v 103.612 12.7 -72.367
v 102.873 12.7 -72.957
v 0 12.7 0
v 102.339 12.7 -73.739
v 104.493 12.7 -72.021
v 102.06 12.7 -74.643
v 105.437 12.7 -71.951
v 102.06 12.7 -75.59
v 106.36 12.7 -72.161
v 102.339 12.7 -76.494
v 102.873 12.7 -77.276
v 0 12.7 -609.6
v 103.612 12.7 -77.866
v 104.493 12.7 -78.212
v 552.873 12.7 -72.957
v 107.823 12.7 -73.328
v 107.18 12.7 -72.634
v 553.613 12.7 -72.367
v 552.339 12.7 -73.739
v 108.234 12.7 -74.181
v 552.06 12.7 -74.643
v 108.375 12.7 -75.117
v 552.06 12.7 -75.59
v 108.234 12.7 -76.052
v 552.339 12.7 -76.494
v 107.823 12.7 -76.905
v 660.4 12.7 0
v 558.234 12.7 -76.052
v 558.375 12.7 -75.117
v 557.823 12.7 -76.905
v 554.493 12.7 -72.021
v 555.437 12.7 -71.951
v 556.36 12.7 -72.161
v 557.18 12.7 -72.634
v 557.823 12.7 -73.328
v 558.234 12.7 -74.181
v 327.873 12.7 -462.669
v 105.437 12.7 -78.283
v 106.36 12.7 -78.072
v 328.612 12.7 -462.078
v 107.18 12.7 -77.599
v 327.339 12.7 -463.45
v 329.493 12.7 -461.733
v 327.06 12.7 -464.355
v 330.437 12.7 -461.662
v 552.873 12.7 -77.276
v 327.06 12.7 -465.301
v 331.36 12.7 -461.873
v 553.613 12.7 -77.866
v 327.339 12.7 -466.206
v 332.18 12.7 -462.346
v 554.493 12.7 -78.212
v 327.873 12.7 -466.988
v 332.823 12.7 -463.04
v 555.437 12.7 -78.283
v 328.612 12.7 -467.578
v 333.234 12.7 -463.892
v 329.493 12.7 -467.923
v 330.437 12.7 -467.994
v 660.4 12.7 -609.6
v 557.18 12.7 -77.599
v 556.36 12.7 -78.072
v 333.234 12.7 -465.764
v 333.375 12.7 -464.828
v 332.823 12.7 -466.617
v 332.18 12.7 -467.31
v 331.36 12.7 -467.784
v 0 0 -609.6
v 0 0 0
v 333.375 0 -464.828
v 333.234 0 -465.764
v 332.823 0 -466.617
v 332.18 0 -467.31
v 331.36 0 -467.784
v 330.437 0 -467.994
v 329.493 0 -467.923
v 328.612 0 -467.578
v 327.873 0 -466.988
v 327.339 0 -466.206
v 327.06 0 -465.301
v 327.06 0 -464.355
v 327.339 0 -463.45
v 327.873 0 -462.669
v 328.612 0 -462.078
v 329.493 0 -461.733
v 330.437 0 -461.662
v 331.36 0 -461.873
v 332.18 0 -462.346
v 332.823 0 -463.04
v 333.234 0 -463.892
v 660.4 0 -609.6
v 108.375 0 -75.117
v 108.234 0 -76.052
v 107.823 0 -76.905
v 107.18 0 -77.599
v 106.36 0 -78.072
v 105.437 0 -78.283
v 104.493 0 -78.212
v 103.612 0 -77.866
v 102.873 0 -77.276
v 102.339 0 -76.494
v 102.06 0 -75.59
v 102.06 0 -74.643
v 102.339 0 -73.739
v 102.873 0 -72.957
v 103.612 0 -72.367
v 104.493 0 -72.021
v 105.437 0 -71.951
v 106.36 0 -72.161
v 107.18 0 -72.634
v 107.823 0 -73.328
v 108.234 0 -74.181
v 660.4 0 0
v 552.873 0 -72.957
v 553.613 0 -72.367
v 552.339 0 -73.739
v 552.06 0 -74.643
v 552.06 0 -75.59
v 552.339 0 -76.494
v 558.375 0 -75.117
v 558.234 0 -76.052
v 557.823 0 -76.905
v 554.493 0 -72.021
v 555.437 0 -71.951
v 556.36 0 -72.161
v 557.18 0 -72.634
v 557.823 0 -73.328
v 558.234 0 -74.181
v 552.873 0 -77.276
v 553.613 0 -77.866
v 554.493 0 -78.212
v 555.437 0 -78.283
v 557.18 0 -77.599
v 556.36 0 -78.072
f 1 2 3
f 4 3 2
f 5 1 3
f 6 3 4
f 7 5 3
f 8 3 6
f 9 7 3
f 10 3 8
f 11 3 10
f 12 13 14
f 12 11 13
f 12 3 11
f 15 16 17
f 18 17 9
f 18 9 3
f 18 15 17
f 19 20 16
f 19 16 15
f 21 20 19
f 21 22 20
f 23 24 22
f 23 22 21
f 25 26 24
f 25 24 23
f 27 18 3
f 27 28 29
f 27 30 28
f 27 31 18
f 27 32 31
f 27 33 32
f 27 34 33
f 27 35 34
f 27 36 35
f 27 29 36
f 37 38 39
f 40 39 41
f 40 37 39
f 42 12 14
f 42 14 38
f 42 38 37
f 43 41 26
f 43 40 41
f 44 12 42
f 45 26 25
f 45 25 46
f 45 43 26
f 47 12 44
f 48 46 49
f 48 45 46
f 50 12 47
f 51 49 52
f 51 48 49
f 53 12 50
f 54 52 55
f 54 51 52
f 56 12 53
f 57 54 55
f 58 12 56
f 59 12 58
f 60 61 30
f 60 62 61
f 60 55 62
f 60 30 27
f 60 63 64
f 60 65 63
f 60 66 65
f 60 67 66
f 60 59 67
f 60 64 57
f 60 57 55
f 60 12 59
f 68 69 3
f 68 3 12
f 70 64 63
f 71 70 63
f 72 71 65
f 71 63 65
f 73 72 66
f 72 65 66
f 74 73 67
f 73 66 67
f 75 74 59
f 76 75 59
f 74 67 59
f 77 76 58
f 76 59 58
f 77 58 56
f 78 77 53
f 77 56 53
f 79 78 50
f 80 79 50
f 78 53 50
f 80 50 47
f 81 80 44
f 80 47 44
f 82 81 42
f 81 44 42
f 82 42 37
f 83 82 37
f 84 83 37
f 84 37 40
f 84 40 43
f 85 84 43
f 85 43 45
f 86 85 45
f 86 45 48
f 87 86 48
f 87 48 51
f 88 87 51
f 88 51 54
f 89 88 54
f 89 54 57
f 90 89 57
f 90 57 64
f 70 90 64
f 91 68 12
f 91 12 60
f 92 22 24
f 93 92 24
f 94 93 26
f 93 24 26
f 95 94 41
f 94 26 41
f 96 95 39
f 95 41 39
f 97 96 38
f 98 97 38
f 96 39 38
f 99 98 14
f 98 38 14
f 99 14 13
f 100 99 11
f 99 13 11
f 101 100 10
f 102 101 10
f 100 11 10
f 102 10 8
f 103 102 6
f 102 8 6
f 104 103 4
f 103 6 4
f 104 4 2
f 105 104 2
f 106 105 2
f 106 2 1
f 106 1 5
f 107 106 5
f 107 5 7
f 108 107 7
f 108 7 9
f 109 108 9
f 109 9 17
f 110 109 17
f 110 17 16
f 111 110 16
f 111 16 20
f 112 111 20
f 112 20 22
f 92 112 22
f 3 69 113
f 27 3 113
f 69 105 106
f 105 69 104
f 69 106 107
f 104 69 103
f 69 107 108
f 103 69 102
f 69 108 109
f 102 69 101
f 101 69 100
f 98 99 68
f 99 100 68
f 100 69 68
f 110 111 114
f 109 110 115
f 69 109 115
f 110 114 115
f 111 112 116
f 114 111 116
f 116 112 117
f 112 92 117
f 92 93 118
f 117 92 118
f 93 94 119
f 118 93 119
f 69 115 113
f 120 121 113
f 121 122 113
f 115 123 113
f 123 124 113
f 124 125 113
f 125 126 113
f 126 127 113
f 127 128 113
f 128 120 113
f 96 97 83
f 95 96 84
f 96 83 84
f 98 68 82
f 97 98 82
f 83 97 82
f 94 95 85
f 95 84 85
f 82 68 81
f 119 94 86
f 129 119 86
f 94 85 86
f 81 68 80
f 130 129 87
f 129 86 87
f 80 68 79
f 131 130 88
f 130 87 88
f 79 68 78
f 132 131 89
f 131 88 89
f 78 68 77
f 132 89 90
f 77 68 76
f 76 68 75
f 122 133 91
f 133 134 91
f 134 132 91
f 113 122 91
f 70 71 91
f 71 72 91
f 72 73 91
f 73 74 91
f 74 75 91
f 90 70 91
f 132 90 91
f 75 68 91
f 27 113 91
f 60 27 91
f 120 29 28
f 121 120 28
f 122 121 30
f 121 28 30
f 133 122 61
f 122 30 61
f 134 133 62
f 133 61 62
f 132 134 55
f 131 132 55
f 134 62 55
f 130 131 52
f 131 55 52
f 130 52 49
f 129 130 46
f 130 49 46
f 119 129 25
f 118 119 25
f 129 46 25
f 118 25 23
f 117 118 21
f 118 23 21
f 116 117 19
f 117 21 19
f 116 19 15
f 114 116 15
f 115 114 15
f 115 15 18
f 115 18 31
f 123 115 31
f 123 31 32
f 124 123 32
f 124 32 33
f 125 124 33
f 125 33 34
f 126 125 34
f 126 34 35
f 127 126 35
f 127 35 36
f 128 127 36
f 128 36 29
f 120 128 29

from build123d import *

# Parameters (mm, degrees)
SKETCH1_W           = 660.4
SKETCH1_H           = 609.6
BOSS_EXTRUDE1_DEPTH = 12.7
SKETCH5_R           = 3.175
CUT_EXTRUDE2_DEPTH  = 13.7


with BuildPart() as part:
    # Sketch1 → Boss-Extrude1 (new body)
    with BuildSketch(Plane(origin=(0, 0, 0), x_dir=(1, 0, 0), z_dir=(0, 1, 0))):
        with Locations((330.2, 304.8)):
            Rectangle(SKETCH1_W, SKETCH1_H)
    extrude(amount=BOSS_EXTRUDE1_DEPTH)

    # Sketch5 → Cut-Extrude2 (cut, through all)
    with BuildSketch(Plane(origin=(0, 12.7, 0), x_dir=(1, 0, 0), z_dir=(0, 1, 0))):
        with Locations((105.2, 75.116646637)):
            Circle(SKETCH5_R)
        with Locations((555.2, 75.116646637)):
            Circle(SKETCH5_R)
        with Locations((330.2, 464.82807834)):
            Circle(SKETCH5_R)
    extrude(amount=-CUT_EXTRUDE2_DEPTH, mode=Mode.SUBTRACT)


solid = part.part
